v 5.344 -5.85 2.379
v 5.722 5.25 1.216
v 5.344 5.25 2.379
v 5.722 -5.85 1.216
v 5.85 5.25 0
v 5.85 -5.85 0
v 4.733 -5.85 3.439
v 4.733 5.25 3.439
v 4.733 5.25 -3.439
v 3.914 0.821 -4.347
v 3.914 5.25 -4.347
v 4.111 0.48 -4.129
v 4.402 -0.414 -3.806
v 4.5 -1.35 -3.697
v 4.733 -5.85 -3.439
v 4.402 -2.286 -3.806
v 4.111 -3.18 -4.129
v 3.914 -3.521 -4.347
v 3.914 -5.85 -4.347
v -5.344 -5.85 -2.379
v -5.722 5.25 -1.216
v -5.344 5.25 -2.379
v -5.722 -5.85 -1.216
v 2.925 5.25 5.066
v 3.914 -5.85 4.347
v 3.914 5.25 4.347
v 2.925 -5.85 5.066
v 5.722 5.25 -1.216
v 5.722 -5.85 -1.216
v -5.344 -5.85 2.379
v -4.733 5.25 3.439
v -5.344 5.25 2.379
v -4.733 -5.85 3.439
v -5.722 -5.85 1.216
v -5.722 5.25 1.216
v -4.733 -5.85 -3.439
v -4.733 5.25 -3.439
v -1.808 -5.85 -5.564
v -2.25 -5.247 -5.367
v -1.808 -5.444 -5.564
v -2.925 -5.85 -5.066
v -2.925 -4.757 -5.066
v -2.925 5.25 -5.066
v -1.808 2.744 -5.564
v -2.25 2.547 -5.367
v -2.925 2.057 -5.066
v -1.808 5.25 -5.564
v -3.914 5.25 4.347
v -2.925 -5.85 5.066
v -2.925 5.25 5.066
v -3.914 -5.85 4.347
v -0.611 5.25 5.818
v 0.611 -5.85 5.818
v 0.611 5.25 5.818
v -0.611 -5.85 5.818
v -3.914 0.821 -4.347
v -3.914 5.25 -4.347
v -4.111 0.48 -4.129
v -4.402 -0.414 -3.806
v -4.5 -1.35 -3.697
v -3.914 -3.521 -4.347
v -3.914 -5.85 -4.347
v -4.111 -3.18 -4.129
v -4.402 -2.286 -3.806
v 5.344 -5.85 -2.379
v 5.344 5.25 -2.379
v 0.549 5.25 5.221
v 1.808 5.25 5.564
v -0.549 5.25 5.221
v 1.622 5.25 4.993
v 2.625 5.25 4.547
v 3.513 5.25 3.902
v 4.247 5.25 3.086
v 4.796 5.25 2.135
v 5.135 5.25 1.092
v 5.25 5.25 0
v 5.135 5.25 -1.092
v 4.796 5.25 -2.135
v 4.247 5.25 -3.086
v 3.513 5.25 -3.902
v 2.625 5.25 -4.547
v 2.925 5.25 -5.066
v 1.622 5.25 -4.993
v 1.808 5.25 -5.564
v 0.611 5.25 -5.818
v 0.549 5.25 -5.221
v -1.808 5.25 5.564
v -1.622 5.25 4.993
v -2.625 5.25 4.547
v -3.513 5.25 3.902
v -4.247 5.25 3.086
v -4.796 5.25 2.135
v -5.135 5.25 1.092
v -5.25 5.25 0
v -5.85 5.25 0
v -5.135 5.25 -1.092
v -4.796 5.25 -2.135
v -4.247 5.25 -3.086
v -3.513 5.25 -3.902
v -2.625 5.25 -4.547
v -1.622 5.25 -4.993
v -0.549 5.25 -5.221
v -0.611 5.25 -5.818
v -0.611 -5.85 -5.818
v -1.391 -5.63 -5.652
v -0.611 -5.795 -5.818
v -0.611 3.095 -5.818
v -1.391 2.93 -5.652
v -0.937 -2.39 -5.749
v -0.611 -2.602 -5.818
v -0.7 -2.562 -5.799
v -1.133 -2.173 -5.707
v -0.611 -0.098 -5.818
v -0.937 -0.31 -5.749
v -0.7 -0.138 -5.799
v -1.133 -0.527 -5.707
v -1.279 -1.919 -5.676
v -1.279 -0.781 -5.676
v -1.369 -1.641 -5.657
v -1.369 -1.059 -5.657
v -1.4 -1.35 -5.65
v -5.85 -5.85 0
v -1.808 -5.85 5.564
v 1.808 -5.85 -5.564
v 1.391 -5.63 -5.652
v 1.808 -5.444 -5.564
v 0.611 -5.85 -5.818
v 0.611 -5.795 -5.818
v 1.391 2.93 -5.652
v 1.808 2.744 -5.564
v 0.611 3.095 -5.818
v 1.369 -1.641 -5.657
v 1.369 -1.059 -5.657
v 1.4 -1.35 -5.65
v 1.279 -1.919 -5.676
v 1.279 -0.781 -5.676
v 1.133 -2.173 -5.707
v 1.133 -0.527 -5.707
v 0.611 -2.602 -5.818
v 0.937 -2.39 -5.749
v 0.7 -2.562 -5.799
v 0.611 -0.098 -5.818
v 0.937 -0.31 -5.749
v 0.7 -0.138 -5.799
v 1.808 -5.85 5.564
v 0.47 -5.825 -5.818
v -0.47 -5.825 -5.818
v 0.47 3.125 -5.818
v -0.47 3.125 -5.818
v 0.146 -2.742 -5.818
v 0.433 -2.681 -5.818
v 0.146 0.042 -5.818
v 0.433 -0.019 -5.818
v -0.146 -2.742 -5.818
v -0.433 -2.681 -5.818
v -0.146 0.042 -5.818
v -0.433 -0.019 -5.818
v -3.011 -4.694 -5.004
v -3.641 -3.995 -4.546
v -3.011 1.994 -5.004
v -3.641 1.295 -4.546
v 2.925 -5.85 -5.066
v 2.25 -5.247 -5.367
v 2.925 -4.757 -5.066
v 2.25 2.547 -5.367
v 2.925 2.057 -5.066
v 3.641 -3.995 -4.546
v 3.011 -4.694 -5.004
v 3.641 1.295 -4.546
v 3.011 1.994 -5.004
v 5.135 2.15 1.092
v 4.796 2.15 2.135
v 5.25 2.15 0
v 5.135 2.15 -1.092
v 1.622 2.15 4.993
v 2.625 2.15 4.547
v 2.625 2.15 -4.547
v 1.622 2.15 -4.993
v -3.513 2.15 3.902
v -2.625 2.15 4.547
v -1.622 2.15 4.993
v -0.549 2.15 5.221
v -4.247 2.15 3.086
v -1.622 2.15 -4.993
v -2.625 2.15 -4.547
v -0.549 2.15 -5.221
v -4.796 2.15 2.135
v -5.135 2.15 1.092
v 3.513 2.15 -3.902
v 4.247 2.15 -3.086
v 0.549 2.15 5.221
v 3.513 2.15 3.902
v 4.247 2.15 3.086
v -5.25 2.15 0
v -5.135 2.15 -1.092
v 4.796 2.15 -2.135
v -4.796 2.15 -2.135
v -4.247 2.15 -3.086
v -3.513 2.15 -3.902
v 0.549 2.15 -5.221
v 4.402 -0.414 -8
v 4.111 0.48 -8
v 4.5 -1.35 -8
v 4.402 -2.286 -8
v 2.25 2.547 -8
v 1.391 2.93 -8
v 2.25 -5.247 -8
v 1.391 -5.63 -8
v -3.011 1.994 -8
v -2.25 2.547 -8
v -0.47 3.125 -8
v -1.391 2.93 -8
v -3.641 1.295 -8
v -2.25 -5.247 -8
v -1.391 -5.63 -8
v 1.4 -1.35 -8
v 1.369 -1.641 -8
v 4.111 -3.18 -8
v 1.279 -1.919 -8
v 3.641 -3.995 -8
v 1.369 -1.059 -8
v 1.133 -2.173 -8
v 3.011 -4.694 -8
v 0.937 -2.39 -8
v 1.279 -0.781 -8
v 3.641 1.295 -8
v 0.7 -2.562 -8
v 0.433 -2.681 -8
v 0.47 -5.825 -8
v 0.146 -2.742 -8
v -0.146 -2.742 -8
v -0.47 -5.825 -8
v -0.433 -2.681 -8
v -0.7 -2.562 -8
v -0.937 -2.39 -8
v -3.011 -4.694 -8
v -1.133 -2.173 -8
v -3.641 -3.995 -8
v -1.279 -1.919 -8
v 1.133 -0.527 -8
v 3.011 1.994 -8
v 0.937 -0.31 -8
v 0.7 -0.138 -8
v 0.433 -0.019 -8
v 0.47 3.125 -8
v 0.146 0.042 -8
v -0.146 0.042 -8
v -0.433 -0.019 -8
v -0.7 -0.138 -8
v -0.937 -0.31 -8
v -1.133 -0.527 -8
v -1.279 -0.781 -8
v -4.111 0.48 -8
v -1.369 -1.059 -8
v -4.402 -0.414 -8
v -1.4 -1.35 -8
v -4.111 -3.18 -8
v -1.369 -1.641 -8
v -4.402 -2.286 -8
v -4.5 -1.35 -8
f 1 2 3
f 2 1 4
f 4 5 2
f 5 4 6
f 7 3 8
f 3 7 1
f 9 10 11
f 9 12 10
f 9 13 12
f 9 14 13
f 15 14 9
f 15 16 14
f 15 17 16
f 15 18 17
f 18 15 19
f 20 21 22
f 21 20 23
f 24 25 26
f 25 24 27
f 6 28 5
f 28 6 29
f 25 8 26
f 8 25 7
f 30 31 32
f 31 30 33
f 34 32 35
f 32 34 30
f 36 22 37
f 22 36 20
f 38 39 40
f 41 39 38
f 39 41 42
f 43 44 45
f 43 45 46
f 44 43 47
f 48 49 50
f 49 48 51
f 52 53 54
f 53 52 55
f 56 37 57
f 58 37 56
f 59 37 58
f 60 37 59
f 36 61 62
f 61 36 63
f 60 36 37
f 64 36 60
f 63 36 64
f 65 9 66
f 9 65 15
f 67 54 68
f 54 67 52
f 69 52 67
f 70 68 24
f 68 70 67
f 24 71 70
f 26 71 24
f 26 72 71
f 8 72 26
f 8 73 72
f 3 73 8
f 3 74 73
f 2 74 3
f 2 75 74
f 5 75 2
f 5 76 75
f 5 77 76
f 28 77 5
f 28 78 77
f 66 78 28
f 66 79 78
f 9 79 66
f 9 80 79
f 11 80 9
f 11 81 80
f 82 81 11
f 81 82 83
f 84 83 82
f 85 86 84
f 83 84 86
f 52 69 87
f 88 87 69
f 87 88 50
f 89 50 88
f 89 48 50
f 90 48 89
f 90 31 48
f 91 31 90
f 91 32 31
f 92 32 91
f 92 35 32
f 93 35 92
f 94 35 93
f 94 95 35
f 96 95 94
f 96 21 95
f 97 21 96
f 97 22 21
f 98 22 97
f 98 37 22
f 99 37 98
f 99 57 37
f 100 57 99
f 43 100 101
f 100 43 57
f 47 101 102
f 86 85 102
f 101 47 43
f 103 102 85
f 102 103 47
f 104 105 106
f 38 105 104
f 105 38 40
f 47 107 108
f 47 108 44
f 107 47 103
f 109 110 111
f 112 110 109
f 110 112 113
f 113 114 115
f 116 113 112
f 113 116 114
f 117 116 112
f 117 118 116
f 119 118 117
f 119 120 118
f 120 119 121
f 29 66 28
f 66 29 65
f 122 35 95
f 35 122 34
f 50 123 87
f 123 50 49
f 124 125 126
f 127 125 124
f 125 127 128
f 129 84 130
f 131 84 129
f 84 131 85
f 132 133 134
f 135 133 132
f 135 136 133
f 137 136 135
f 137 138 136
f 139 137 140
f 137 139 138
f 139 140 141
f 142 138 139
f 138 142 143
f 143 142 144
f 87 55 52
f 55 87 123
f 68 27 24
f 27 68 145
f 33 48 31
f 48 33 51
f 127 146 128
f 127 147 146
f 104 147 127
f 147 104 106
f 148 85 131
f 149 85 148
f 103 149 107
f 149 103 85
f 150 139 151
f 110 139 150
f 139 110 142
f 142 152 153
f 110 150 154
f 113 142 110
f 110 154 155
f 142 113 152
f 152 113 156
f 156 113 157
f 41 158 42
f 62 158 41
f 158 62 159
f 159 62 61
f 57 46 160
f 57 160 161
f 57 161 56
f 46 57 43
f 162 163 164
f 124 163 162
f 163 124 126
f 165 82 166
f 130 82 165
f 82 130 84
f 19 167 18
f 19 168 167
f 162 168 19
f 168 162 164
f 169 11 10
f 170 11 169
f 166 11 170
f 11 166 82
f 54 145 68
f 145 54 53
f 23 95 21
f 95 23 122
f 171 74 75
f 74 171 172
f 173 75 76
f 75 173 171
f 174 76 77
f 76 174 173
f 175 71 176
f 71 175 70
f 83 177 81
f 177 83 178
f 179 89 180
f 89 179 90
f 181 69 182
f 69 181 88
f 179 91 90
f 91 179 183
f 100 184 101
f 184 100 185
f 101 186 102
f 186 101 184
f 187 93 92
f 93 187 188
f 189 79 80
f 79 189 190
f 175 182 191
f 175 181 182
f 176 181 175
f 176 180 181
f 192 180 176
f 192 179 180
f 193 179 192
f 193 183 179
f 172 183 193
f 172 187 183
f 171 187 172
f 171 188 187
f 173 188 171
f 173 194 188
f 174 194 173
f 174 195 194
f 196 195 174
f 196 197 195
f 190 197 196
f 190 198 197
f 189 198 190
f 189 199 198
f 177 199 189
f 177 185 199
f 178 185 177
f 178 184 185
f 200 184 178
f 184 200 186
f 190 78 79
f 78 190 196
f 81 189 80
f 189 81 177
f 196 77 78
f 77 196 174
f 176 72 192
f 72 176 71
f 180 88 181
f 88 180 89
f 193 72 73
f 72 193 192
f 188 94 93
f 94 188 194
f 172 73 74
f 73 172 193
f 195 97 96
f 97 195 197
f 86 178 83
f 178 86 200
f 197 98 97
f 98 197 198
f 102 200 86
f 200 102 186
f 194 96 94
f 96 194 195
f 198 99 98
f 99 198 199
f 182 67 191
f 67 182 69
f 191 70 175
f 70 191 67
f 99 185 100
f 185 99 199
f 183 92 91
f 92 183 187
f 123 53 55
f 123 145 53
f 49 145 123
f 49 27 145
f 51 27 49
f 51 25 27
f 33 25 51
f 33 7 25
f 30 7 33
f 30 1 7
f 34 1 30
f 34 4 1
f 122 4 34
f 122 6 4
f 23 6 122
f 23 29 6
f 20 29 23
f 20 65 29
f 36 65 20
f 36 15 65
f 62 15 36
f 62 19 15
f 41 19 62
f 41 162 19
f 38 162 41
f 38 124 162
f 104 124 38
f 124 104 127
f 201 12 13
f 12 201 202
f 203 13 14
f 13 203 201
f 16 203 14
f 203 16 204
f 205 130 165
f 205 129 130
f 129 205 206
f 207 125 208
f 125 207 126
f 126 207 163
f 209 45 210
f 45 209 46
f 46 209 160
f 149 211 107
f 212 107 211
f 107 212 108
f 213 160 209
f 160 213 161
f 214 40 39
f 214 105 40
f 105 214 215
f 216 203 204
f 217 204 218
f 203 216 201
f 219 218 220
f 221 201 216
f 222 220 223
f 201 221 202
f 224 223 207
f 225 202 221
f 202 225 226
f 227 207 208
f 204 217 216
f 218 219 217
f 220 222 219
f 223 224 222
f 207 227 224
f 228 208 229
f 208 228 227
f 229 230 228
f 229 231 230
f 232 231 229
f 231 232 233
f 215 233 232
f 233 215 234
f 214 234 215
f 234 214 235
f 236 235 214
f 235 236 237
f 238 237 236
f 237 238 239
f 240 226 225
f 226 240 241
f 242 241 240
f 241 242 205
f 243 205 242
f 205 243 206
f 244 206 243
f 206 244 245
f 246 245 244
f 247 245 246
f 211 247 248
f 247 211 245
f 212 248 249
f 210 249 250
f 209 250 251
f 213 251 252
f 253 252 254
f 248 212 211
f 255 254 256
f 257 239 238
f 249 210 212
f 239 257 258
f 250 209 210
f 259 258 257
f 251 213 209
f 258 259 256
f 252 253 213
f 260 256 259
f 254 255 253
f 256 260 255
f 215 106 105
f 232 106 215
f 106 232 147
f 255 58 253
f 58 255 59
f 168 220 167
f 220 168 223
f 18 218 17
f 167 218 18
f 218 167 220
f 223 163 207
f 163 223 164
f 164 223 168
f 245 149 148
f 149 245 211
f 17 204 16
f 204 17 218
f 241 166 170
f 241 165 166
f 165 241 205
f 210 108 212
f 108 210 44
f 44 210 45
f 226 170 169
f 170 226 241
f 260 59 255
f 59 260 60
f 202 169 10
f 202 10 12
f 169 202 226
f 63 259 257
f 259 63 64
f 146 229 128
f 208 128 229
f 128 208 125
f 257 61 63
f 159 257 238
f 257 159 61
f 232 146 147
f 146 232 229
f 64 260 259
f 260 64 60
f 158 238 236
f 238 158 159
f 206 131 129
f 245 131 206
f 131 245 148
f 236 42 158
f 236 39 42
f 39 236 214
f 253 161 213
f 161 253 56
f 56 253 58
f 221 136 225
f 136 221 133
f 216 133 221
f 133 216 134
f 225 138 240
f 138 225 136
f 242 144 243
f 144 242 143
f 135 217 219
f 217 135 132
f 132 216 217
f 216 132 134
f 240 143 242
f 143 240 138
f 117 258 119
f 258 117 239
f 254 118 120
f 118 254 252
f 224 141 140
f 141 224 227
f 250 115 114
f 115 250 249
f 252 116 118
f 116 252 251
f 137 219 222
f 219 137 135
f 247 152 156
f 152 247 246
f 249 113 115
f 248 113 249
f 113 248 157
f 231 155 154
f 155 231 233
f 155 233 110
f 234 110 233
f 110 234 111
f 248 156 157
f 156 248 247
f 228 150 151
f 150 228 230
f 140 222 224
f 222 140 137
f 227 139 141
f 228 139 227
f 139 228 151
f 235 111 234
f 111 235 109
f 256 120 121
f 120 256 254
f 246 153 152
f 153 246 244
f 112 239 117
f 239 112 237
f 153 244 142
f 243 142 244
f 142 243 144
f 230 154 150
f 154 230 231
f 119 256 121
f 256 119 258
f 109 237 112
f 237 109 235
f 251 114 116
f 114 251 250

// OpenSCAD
SCREW_DIA = 2.8;
STANDOFF_DIA = 9;
STANDOFF_HEIGHT = 8;
SCREW_LENGTH = STANDOFF_HEIGHT - 3;

MAGNET_DIA = 10.5;
MAGNET_HEIGHT = 3.1;
HOLDER_DIA = MAGNET_DIA+1.2;
HOLDER_HEIGHT = 5.25;

ANGLE = 90;
ROUNDED = false;

$fn = 30;

module tube(outer_dia, inner_dia, outer_height, inner_height) {
    difference() {
        cylinder(d = outer_dia, h = outer_height);
        cylinder(d = inner_dia, h = inner_height);
    }    
}

module standoff() {
    tube(STANDOFF_DIA, SCREW_DIA, STANDOFF_HEIGHT, SCREW_LENGTH);    
}

module magnet_mount() {
    union() {
        intersection() {
            if(ROUNDED) sphere(d = HOLDER_DIA);
            cylinder(d = HOLDER_DIA, h = HOLDER_DIA/2);
        }
        translate([0, 0, -HOLDER_HEIGHT])
            tube(HOLDER_DIA, MAGNET_DIA, HOLDER_HEIGHT, MAGNET_HEIGHT);
    }    
}

module mount_joint() {
    rotate([ANGLE, 0, 0])
        magnet_mount();
}

union() {
    mount_joint();
    difference() {
        translate([0, -HOLDER_DIA/2+STANDOFF_DIA/2, -STANDOFF_HEIGHT])
            standoff();
        hull() 
            mount_joint();
    }
}
